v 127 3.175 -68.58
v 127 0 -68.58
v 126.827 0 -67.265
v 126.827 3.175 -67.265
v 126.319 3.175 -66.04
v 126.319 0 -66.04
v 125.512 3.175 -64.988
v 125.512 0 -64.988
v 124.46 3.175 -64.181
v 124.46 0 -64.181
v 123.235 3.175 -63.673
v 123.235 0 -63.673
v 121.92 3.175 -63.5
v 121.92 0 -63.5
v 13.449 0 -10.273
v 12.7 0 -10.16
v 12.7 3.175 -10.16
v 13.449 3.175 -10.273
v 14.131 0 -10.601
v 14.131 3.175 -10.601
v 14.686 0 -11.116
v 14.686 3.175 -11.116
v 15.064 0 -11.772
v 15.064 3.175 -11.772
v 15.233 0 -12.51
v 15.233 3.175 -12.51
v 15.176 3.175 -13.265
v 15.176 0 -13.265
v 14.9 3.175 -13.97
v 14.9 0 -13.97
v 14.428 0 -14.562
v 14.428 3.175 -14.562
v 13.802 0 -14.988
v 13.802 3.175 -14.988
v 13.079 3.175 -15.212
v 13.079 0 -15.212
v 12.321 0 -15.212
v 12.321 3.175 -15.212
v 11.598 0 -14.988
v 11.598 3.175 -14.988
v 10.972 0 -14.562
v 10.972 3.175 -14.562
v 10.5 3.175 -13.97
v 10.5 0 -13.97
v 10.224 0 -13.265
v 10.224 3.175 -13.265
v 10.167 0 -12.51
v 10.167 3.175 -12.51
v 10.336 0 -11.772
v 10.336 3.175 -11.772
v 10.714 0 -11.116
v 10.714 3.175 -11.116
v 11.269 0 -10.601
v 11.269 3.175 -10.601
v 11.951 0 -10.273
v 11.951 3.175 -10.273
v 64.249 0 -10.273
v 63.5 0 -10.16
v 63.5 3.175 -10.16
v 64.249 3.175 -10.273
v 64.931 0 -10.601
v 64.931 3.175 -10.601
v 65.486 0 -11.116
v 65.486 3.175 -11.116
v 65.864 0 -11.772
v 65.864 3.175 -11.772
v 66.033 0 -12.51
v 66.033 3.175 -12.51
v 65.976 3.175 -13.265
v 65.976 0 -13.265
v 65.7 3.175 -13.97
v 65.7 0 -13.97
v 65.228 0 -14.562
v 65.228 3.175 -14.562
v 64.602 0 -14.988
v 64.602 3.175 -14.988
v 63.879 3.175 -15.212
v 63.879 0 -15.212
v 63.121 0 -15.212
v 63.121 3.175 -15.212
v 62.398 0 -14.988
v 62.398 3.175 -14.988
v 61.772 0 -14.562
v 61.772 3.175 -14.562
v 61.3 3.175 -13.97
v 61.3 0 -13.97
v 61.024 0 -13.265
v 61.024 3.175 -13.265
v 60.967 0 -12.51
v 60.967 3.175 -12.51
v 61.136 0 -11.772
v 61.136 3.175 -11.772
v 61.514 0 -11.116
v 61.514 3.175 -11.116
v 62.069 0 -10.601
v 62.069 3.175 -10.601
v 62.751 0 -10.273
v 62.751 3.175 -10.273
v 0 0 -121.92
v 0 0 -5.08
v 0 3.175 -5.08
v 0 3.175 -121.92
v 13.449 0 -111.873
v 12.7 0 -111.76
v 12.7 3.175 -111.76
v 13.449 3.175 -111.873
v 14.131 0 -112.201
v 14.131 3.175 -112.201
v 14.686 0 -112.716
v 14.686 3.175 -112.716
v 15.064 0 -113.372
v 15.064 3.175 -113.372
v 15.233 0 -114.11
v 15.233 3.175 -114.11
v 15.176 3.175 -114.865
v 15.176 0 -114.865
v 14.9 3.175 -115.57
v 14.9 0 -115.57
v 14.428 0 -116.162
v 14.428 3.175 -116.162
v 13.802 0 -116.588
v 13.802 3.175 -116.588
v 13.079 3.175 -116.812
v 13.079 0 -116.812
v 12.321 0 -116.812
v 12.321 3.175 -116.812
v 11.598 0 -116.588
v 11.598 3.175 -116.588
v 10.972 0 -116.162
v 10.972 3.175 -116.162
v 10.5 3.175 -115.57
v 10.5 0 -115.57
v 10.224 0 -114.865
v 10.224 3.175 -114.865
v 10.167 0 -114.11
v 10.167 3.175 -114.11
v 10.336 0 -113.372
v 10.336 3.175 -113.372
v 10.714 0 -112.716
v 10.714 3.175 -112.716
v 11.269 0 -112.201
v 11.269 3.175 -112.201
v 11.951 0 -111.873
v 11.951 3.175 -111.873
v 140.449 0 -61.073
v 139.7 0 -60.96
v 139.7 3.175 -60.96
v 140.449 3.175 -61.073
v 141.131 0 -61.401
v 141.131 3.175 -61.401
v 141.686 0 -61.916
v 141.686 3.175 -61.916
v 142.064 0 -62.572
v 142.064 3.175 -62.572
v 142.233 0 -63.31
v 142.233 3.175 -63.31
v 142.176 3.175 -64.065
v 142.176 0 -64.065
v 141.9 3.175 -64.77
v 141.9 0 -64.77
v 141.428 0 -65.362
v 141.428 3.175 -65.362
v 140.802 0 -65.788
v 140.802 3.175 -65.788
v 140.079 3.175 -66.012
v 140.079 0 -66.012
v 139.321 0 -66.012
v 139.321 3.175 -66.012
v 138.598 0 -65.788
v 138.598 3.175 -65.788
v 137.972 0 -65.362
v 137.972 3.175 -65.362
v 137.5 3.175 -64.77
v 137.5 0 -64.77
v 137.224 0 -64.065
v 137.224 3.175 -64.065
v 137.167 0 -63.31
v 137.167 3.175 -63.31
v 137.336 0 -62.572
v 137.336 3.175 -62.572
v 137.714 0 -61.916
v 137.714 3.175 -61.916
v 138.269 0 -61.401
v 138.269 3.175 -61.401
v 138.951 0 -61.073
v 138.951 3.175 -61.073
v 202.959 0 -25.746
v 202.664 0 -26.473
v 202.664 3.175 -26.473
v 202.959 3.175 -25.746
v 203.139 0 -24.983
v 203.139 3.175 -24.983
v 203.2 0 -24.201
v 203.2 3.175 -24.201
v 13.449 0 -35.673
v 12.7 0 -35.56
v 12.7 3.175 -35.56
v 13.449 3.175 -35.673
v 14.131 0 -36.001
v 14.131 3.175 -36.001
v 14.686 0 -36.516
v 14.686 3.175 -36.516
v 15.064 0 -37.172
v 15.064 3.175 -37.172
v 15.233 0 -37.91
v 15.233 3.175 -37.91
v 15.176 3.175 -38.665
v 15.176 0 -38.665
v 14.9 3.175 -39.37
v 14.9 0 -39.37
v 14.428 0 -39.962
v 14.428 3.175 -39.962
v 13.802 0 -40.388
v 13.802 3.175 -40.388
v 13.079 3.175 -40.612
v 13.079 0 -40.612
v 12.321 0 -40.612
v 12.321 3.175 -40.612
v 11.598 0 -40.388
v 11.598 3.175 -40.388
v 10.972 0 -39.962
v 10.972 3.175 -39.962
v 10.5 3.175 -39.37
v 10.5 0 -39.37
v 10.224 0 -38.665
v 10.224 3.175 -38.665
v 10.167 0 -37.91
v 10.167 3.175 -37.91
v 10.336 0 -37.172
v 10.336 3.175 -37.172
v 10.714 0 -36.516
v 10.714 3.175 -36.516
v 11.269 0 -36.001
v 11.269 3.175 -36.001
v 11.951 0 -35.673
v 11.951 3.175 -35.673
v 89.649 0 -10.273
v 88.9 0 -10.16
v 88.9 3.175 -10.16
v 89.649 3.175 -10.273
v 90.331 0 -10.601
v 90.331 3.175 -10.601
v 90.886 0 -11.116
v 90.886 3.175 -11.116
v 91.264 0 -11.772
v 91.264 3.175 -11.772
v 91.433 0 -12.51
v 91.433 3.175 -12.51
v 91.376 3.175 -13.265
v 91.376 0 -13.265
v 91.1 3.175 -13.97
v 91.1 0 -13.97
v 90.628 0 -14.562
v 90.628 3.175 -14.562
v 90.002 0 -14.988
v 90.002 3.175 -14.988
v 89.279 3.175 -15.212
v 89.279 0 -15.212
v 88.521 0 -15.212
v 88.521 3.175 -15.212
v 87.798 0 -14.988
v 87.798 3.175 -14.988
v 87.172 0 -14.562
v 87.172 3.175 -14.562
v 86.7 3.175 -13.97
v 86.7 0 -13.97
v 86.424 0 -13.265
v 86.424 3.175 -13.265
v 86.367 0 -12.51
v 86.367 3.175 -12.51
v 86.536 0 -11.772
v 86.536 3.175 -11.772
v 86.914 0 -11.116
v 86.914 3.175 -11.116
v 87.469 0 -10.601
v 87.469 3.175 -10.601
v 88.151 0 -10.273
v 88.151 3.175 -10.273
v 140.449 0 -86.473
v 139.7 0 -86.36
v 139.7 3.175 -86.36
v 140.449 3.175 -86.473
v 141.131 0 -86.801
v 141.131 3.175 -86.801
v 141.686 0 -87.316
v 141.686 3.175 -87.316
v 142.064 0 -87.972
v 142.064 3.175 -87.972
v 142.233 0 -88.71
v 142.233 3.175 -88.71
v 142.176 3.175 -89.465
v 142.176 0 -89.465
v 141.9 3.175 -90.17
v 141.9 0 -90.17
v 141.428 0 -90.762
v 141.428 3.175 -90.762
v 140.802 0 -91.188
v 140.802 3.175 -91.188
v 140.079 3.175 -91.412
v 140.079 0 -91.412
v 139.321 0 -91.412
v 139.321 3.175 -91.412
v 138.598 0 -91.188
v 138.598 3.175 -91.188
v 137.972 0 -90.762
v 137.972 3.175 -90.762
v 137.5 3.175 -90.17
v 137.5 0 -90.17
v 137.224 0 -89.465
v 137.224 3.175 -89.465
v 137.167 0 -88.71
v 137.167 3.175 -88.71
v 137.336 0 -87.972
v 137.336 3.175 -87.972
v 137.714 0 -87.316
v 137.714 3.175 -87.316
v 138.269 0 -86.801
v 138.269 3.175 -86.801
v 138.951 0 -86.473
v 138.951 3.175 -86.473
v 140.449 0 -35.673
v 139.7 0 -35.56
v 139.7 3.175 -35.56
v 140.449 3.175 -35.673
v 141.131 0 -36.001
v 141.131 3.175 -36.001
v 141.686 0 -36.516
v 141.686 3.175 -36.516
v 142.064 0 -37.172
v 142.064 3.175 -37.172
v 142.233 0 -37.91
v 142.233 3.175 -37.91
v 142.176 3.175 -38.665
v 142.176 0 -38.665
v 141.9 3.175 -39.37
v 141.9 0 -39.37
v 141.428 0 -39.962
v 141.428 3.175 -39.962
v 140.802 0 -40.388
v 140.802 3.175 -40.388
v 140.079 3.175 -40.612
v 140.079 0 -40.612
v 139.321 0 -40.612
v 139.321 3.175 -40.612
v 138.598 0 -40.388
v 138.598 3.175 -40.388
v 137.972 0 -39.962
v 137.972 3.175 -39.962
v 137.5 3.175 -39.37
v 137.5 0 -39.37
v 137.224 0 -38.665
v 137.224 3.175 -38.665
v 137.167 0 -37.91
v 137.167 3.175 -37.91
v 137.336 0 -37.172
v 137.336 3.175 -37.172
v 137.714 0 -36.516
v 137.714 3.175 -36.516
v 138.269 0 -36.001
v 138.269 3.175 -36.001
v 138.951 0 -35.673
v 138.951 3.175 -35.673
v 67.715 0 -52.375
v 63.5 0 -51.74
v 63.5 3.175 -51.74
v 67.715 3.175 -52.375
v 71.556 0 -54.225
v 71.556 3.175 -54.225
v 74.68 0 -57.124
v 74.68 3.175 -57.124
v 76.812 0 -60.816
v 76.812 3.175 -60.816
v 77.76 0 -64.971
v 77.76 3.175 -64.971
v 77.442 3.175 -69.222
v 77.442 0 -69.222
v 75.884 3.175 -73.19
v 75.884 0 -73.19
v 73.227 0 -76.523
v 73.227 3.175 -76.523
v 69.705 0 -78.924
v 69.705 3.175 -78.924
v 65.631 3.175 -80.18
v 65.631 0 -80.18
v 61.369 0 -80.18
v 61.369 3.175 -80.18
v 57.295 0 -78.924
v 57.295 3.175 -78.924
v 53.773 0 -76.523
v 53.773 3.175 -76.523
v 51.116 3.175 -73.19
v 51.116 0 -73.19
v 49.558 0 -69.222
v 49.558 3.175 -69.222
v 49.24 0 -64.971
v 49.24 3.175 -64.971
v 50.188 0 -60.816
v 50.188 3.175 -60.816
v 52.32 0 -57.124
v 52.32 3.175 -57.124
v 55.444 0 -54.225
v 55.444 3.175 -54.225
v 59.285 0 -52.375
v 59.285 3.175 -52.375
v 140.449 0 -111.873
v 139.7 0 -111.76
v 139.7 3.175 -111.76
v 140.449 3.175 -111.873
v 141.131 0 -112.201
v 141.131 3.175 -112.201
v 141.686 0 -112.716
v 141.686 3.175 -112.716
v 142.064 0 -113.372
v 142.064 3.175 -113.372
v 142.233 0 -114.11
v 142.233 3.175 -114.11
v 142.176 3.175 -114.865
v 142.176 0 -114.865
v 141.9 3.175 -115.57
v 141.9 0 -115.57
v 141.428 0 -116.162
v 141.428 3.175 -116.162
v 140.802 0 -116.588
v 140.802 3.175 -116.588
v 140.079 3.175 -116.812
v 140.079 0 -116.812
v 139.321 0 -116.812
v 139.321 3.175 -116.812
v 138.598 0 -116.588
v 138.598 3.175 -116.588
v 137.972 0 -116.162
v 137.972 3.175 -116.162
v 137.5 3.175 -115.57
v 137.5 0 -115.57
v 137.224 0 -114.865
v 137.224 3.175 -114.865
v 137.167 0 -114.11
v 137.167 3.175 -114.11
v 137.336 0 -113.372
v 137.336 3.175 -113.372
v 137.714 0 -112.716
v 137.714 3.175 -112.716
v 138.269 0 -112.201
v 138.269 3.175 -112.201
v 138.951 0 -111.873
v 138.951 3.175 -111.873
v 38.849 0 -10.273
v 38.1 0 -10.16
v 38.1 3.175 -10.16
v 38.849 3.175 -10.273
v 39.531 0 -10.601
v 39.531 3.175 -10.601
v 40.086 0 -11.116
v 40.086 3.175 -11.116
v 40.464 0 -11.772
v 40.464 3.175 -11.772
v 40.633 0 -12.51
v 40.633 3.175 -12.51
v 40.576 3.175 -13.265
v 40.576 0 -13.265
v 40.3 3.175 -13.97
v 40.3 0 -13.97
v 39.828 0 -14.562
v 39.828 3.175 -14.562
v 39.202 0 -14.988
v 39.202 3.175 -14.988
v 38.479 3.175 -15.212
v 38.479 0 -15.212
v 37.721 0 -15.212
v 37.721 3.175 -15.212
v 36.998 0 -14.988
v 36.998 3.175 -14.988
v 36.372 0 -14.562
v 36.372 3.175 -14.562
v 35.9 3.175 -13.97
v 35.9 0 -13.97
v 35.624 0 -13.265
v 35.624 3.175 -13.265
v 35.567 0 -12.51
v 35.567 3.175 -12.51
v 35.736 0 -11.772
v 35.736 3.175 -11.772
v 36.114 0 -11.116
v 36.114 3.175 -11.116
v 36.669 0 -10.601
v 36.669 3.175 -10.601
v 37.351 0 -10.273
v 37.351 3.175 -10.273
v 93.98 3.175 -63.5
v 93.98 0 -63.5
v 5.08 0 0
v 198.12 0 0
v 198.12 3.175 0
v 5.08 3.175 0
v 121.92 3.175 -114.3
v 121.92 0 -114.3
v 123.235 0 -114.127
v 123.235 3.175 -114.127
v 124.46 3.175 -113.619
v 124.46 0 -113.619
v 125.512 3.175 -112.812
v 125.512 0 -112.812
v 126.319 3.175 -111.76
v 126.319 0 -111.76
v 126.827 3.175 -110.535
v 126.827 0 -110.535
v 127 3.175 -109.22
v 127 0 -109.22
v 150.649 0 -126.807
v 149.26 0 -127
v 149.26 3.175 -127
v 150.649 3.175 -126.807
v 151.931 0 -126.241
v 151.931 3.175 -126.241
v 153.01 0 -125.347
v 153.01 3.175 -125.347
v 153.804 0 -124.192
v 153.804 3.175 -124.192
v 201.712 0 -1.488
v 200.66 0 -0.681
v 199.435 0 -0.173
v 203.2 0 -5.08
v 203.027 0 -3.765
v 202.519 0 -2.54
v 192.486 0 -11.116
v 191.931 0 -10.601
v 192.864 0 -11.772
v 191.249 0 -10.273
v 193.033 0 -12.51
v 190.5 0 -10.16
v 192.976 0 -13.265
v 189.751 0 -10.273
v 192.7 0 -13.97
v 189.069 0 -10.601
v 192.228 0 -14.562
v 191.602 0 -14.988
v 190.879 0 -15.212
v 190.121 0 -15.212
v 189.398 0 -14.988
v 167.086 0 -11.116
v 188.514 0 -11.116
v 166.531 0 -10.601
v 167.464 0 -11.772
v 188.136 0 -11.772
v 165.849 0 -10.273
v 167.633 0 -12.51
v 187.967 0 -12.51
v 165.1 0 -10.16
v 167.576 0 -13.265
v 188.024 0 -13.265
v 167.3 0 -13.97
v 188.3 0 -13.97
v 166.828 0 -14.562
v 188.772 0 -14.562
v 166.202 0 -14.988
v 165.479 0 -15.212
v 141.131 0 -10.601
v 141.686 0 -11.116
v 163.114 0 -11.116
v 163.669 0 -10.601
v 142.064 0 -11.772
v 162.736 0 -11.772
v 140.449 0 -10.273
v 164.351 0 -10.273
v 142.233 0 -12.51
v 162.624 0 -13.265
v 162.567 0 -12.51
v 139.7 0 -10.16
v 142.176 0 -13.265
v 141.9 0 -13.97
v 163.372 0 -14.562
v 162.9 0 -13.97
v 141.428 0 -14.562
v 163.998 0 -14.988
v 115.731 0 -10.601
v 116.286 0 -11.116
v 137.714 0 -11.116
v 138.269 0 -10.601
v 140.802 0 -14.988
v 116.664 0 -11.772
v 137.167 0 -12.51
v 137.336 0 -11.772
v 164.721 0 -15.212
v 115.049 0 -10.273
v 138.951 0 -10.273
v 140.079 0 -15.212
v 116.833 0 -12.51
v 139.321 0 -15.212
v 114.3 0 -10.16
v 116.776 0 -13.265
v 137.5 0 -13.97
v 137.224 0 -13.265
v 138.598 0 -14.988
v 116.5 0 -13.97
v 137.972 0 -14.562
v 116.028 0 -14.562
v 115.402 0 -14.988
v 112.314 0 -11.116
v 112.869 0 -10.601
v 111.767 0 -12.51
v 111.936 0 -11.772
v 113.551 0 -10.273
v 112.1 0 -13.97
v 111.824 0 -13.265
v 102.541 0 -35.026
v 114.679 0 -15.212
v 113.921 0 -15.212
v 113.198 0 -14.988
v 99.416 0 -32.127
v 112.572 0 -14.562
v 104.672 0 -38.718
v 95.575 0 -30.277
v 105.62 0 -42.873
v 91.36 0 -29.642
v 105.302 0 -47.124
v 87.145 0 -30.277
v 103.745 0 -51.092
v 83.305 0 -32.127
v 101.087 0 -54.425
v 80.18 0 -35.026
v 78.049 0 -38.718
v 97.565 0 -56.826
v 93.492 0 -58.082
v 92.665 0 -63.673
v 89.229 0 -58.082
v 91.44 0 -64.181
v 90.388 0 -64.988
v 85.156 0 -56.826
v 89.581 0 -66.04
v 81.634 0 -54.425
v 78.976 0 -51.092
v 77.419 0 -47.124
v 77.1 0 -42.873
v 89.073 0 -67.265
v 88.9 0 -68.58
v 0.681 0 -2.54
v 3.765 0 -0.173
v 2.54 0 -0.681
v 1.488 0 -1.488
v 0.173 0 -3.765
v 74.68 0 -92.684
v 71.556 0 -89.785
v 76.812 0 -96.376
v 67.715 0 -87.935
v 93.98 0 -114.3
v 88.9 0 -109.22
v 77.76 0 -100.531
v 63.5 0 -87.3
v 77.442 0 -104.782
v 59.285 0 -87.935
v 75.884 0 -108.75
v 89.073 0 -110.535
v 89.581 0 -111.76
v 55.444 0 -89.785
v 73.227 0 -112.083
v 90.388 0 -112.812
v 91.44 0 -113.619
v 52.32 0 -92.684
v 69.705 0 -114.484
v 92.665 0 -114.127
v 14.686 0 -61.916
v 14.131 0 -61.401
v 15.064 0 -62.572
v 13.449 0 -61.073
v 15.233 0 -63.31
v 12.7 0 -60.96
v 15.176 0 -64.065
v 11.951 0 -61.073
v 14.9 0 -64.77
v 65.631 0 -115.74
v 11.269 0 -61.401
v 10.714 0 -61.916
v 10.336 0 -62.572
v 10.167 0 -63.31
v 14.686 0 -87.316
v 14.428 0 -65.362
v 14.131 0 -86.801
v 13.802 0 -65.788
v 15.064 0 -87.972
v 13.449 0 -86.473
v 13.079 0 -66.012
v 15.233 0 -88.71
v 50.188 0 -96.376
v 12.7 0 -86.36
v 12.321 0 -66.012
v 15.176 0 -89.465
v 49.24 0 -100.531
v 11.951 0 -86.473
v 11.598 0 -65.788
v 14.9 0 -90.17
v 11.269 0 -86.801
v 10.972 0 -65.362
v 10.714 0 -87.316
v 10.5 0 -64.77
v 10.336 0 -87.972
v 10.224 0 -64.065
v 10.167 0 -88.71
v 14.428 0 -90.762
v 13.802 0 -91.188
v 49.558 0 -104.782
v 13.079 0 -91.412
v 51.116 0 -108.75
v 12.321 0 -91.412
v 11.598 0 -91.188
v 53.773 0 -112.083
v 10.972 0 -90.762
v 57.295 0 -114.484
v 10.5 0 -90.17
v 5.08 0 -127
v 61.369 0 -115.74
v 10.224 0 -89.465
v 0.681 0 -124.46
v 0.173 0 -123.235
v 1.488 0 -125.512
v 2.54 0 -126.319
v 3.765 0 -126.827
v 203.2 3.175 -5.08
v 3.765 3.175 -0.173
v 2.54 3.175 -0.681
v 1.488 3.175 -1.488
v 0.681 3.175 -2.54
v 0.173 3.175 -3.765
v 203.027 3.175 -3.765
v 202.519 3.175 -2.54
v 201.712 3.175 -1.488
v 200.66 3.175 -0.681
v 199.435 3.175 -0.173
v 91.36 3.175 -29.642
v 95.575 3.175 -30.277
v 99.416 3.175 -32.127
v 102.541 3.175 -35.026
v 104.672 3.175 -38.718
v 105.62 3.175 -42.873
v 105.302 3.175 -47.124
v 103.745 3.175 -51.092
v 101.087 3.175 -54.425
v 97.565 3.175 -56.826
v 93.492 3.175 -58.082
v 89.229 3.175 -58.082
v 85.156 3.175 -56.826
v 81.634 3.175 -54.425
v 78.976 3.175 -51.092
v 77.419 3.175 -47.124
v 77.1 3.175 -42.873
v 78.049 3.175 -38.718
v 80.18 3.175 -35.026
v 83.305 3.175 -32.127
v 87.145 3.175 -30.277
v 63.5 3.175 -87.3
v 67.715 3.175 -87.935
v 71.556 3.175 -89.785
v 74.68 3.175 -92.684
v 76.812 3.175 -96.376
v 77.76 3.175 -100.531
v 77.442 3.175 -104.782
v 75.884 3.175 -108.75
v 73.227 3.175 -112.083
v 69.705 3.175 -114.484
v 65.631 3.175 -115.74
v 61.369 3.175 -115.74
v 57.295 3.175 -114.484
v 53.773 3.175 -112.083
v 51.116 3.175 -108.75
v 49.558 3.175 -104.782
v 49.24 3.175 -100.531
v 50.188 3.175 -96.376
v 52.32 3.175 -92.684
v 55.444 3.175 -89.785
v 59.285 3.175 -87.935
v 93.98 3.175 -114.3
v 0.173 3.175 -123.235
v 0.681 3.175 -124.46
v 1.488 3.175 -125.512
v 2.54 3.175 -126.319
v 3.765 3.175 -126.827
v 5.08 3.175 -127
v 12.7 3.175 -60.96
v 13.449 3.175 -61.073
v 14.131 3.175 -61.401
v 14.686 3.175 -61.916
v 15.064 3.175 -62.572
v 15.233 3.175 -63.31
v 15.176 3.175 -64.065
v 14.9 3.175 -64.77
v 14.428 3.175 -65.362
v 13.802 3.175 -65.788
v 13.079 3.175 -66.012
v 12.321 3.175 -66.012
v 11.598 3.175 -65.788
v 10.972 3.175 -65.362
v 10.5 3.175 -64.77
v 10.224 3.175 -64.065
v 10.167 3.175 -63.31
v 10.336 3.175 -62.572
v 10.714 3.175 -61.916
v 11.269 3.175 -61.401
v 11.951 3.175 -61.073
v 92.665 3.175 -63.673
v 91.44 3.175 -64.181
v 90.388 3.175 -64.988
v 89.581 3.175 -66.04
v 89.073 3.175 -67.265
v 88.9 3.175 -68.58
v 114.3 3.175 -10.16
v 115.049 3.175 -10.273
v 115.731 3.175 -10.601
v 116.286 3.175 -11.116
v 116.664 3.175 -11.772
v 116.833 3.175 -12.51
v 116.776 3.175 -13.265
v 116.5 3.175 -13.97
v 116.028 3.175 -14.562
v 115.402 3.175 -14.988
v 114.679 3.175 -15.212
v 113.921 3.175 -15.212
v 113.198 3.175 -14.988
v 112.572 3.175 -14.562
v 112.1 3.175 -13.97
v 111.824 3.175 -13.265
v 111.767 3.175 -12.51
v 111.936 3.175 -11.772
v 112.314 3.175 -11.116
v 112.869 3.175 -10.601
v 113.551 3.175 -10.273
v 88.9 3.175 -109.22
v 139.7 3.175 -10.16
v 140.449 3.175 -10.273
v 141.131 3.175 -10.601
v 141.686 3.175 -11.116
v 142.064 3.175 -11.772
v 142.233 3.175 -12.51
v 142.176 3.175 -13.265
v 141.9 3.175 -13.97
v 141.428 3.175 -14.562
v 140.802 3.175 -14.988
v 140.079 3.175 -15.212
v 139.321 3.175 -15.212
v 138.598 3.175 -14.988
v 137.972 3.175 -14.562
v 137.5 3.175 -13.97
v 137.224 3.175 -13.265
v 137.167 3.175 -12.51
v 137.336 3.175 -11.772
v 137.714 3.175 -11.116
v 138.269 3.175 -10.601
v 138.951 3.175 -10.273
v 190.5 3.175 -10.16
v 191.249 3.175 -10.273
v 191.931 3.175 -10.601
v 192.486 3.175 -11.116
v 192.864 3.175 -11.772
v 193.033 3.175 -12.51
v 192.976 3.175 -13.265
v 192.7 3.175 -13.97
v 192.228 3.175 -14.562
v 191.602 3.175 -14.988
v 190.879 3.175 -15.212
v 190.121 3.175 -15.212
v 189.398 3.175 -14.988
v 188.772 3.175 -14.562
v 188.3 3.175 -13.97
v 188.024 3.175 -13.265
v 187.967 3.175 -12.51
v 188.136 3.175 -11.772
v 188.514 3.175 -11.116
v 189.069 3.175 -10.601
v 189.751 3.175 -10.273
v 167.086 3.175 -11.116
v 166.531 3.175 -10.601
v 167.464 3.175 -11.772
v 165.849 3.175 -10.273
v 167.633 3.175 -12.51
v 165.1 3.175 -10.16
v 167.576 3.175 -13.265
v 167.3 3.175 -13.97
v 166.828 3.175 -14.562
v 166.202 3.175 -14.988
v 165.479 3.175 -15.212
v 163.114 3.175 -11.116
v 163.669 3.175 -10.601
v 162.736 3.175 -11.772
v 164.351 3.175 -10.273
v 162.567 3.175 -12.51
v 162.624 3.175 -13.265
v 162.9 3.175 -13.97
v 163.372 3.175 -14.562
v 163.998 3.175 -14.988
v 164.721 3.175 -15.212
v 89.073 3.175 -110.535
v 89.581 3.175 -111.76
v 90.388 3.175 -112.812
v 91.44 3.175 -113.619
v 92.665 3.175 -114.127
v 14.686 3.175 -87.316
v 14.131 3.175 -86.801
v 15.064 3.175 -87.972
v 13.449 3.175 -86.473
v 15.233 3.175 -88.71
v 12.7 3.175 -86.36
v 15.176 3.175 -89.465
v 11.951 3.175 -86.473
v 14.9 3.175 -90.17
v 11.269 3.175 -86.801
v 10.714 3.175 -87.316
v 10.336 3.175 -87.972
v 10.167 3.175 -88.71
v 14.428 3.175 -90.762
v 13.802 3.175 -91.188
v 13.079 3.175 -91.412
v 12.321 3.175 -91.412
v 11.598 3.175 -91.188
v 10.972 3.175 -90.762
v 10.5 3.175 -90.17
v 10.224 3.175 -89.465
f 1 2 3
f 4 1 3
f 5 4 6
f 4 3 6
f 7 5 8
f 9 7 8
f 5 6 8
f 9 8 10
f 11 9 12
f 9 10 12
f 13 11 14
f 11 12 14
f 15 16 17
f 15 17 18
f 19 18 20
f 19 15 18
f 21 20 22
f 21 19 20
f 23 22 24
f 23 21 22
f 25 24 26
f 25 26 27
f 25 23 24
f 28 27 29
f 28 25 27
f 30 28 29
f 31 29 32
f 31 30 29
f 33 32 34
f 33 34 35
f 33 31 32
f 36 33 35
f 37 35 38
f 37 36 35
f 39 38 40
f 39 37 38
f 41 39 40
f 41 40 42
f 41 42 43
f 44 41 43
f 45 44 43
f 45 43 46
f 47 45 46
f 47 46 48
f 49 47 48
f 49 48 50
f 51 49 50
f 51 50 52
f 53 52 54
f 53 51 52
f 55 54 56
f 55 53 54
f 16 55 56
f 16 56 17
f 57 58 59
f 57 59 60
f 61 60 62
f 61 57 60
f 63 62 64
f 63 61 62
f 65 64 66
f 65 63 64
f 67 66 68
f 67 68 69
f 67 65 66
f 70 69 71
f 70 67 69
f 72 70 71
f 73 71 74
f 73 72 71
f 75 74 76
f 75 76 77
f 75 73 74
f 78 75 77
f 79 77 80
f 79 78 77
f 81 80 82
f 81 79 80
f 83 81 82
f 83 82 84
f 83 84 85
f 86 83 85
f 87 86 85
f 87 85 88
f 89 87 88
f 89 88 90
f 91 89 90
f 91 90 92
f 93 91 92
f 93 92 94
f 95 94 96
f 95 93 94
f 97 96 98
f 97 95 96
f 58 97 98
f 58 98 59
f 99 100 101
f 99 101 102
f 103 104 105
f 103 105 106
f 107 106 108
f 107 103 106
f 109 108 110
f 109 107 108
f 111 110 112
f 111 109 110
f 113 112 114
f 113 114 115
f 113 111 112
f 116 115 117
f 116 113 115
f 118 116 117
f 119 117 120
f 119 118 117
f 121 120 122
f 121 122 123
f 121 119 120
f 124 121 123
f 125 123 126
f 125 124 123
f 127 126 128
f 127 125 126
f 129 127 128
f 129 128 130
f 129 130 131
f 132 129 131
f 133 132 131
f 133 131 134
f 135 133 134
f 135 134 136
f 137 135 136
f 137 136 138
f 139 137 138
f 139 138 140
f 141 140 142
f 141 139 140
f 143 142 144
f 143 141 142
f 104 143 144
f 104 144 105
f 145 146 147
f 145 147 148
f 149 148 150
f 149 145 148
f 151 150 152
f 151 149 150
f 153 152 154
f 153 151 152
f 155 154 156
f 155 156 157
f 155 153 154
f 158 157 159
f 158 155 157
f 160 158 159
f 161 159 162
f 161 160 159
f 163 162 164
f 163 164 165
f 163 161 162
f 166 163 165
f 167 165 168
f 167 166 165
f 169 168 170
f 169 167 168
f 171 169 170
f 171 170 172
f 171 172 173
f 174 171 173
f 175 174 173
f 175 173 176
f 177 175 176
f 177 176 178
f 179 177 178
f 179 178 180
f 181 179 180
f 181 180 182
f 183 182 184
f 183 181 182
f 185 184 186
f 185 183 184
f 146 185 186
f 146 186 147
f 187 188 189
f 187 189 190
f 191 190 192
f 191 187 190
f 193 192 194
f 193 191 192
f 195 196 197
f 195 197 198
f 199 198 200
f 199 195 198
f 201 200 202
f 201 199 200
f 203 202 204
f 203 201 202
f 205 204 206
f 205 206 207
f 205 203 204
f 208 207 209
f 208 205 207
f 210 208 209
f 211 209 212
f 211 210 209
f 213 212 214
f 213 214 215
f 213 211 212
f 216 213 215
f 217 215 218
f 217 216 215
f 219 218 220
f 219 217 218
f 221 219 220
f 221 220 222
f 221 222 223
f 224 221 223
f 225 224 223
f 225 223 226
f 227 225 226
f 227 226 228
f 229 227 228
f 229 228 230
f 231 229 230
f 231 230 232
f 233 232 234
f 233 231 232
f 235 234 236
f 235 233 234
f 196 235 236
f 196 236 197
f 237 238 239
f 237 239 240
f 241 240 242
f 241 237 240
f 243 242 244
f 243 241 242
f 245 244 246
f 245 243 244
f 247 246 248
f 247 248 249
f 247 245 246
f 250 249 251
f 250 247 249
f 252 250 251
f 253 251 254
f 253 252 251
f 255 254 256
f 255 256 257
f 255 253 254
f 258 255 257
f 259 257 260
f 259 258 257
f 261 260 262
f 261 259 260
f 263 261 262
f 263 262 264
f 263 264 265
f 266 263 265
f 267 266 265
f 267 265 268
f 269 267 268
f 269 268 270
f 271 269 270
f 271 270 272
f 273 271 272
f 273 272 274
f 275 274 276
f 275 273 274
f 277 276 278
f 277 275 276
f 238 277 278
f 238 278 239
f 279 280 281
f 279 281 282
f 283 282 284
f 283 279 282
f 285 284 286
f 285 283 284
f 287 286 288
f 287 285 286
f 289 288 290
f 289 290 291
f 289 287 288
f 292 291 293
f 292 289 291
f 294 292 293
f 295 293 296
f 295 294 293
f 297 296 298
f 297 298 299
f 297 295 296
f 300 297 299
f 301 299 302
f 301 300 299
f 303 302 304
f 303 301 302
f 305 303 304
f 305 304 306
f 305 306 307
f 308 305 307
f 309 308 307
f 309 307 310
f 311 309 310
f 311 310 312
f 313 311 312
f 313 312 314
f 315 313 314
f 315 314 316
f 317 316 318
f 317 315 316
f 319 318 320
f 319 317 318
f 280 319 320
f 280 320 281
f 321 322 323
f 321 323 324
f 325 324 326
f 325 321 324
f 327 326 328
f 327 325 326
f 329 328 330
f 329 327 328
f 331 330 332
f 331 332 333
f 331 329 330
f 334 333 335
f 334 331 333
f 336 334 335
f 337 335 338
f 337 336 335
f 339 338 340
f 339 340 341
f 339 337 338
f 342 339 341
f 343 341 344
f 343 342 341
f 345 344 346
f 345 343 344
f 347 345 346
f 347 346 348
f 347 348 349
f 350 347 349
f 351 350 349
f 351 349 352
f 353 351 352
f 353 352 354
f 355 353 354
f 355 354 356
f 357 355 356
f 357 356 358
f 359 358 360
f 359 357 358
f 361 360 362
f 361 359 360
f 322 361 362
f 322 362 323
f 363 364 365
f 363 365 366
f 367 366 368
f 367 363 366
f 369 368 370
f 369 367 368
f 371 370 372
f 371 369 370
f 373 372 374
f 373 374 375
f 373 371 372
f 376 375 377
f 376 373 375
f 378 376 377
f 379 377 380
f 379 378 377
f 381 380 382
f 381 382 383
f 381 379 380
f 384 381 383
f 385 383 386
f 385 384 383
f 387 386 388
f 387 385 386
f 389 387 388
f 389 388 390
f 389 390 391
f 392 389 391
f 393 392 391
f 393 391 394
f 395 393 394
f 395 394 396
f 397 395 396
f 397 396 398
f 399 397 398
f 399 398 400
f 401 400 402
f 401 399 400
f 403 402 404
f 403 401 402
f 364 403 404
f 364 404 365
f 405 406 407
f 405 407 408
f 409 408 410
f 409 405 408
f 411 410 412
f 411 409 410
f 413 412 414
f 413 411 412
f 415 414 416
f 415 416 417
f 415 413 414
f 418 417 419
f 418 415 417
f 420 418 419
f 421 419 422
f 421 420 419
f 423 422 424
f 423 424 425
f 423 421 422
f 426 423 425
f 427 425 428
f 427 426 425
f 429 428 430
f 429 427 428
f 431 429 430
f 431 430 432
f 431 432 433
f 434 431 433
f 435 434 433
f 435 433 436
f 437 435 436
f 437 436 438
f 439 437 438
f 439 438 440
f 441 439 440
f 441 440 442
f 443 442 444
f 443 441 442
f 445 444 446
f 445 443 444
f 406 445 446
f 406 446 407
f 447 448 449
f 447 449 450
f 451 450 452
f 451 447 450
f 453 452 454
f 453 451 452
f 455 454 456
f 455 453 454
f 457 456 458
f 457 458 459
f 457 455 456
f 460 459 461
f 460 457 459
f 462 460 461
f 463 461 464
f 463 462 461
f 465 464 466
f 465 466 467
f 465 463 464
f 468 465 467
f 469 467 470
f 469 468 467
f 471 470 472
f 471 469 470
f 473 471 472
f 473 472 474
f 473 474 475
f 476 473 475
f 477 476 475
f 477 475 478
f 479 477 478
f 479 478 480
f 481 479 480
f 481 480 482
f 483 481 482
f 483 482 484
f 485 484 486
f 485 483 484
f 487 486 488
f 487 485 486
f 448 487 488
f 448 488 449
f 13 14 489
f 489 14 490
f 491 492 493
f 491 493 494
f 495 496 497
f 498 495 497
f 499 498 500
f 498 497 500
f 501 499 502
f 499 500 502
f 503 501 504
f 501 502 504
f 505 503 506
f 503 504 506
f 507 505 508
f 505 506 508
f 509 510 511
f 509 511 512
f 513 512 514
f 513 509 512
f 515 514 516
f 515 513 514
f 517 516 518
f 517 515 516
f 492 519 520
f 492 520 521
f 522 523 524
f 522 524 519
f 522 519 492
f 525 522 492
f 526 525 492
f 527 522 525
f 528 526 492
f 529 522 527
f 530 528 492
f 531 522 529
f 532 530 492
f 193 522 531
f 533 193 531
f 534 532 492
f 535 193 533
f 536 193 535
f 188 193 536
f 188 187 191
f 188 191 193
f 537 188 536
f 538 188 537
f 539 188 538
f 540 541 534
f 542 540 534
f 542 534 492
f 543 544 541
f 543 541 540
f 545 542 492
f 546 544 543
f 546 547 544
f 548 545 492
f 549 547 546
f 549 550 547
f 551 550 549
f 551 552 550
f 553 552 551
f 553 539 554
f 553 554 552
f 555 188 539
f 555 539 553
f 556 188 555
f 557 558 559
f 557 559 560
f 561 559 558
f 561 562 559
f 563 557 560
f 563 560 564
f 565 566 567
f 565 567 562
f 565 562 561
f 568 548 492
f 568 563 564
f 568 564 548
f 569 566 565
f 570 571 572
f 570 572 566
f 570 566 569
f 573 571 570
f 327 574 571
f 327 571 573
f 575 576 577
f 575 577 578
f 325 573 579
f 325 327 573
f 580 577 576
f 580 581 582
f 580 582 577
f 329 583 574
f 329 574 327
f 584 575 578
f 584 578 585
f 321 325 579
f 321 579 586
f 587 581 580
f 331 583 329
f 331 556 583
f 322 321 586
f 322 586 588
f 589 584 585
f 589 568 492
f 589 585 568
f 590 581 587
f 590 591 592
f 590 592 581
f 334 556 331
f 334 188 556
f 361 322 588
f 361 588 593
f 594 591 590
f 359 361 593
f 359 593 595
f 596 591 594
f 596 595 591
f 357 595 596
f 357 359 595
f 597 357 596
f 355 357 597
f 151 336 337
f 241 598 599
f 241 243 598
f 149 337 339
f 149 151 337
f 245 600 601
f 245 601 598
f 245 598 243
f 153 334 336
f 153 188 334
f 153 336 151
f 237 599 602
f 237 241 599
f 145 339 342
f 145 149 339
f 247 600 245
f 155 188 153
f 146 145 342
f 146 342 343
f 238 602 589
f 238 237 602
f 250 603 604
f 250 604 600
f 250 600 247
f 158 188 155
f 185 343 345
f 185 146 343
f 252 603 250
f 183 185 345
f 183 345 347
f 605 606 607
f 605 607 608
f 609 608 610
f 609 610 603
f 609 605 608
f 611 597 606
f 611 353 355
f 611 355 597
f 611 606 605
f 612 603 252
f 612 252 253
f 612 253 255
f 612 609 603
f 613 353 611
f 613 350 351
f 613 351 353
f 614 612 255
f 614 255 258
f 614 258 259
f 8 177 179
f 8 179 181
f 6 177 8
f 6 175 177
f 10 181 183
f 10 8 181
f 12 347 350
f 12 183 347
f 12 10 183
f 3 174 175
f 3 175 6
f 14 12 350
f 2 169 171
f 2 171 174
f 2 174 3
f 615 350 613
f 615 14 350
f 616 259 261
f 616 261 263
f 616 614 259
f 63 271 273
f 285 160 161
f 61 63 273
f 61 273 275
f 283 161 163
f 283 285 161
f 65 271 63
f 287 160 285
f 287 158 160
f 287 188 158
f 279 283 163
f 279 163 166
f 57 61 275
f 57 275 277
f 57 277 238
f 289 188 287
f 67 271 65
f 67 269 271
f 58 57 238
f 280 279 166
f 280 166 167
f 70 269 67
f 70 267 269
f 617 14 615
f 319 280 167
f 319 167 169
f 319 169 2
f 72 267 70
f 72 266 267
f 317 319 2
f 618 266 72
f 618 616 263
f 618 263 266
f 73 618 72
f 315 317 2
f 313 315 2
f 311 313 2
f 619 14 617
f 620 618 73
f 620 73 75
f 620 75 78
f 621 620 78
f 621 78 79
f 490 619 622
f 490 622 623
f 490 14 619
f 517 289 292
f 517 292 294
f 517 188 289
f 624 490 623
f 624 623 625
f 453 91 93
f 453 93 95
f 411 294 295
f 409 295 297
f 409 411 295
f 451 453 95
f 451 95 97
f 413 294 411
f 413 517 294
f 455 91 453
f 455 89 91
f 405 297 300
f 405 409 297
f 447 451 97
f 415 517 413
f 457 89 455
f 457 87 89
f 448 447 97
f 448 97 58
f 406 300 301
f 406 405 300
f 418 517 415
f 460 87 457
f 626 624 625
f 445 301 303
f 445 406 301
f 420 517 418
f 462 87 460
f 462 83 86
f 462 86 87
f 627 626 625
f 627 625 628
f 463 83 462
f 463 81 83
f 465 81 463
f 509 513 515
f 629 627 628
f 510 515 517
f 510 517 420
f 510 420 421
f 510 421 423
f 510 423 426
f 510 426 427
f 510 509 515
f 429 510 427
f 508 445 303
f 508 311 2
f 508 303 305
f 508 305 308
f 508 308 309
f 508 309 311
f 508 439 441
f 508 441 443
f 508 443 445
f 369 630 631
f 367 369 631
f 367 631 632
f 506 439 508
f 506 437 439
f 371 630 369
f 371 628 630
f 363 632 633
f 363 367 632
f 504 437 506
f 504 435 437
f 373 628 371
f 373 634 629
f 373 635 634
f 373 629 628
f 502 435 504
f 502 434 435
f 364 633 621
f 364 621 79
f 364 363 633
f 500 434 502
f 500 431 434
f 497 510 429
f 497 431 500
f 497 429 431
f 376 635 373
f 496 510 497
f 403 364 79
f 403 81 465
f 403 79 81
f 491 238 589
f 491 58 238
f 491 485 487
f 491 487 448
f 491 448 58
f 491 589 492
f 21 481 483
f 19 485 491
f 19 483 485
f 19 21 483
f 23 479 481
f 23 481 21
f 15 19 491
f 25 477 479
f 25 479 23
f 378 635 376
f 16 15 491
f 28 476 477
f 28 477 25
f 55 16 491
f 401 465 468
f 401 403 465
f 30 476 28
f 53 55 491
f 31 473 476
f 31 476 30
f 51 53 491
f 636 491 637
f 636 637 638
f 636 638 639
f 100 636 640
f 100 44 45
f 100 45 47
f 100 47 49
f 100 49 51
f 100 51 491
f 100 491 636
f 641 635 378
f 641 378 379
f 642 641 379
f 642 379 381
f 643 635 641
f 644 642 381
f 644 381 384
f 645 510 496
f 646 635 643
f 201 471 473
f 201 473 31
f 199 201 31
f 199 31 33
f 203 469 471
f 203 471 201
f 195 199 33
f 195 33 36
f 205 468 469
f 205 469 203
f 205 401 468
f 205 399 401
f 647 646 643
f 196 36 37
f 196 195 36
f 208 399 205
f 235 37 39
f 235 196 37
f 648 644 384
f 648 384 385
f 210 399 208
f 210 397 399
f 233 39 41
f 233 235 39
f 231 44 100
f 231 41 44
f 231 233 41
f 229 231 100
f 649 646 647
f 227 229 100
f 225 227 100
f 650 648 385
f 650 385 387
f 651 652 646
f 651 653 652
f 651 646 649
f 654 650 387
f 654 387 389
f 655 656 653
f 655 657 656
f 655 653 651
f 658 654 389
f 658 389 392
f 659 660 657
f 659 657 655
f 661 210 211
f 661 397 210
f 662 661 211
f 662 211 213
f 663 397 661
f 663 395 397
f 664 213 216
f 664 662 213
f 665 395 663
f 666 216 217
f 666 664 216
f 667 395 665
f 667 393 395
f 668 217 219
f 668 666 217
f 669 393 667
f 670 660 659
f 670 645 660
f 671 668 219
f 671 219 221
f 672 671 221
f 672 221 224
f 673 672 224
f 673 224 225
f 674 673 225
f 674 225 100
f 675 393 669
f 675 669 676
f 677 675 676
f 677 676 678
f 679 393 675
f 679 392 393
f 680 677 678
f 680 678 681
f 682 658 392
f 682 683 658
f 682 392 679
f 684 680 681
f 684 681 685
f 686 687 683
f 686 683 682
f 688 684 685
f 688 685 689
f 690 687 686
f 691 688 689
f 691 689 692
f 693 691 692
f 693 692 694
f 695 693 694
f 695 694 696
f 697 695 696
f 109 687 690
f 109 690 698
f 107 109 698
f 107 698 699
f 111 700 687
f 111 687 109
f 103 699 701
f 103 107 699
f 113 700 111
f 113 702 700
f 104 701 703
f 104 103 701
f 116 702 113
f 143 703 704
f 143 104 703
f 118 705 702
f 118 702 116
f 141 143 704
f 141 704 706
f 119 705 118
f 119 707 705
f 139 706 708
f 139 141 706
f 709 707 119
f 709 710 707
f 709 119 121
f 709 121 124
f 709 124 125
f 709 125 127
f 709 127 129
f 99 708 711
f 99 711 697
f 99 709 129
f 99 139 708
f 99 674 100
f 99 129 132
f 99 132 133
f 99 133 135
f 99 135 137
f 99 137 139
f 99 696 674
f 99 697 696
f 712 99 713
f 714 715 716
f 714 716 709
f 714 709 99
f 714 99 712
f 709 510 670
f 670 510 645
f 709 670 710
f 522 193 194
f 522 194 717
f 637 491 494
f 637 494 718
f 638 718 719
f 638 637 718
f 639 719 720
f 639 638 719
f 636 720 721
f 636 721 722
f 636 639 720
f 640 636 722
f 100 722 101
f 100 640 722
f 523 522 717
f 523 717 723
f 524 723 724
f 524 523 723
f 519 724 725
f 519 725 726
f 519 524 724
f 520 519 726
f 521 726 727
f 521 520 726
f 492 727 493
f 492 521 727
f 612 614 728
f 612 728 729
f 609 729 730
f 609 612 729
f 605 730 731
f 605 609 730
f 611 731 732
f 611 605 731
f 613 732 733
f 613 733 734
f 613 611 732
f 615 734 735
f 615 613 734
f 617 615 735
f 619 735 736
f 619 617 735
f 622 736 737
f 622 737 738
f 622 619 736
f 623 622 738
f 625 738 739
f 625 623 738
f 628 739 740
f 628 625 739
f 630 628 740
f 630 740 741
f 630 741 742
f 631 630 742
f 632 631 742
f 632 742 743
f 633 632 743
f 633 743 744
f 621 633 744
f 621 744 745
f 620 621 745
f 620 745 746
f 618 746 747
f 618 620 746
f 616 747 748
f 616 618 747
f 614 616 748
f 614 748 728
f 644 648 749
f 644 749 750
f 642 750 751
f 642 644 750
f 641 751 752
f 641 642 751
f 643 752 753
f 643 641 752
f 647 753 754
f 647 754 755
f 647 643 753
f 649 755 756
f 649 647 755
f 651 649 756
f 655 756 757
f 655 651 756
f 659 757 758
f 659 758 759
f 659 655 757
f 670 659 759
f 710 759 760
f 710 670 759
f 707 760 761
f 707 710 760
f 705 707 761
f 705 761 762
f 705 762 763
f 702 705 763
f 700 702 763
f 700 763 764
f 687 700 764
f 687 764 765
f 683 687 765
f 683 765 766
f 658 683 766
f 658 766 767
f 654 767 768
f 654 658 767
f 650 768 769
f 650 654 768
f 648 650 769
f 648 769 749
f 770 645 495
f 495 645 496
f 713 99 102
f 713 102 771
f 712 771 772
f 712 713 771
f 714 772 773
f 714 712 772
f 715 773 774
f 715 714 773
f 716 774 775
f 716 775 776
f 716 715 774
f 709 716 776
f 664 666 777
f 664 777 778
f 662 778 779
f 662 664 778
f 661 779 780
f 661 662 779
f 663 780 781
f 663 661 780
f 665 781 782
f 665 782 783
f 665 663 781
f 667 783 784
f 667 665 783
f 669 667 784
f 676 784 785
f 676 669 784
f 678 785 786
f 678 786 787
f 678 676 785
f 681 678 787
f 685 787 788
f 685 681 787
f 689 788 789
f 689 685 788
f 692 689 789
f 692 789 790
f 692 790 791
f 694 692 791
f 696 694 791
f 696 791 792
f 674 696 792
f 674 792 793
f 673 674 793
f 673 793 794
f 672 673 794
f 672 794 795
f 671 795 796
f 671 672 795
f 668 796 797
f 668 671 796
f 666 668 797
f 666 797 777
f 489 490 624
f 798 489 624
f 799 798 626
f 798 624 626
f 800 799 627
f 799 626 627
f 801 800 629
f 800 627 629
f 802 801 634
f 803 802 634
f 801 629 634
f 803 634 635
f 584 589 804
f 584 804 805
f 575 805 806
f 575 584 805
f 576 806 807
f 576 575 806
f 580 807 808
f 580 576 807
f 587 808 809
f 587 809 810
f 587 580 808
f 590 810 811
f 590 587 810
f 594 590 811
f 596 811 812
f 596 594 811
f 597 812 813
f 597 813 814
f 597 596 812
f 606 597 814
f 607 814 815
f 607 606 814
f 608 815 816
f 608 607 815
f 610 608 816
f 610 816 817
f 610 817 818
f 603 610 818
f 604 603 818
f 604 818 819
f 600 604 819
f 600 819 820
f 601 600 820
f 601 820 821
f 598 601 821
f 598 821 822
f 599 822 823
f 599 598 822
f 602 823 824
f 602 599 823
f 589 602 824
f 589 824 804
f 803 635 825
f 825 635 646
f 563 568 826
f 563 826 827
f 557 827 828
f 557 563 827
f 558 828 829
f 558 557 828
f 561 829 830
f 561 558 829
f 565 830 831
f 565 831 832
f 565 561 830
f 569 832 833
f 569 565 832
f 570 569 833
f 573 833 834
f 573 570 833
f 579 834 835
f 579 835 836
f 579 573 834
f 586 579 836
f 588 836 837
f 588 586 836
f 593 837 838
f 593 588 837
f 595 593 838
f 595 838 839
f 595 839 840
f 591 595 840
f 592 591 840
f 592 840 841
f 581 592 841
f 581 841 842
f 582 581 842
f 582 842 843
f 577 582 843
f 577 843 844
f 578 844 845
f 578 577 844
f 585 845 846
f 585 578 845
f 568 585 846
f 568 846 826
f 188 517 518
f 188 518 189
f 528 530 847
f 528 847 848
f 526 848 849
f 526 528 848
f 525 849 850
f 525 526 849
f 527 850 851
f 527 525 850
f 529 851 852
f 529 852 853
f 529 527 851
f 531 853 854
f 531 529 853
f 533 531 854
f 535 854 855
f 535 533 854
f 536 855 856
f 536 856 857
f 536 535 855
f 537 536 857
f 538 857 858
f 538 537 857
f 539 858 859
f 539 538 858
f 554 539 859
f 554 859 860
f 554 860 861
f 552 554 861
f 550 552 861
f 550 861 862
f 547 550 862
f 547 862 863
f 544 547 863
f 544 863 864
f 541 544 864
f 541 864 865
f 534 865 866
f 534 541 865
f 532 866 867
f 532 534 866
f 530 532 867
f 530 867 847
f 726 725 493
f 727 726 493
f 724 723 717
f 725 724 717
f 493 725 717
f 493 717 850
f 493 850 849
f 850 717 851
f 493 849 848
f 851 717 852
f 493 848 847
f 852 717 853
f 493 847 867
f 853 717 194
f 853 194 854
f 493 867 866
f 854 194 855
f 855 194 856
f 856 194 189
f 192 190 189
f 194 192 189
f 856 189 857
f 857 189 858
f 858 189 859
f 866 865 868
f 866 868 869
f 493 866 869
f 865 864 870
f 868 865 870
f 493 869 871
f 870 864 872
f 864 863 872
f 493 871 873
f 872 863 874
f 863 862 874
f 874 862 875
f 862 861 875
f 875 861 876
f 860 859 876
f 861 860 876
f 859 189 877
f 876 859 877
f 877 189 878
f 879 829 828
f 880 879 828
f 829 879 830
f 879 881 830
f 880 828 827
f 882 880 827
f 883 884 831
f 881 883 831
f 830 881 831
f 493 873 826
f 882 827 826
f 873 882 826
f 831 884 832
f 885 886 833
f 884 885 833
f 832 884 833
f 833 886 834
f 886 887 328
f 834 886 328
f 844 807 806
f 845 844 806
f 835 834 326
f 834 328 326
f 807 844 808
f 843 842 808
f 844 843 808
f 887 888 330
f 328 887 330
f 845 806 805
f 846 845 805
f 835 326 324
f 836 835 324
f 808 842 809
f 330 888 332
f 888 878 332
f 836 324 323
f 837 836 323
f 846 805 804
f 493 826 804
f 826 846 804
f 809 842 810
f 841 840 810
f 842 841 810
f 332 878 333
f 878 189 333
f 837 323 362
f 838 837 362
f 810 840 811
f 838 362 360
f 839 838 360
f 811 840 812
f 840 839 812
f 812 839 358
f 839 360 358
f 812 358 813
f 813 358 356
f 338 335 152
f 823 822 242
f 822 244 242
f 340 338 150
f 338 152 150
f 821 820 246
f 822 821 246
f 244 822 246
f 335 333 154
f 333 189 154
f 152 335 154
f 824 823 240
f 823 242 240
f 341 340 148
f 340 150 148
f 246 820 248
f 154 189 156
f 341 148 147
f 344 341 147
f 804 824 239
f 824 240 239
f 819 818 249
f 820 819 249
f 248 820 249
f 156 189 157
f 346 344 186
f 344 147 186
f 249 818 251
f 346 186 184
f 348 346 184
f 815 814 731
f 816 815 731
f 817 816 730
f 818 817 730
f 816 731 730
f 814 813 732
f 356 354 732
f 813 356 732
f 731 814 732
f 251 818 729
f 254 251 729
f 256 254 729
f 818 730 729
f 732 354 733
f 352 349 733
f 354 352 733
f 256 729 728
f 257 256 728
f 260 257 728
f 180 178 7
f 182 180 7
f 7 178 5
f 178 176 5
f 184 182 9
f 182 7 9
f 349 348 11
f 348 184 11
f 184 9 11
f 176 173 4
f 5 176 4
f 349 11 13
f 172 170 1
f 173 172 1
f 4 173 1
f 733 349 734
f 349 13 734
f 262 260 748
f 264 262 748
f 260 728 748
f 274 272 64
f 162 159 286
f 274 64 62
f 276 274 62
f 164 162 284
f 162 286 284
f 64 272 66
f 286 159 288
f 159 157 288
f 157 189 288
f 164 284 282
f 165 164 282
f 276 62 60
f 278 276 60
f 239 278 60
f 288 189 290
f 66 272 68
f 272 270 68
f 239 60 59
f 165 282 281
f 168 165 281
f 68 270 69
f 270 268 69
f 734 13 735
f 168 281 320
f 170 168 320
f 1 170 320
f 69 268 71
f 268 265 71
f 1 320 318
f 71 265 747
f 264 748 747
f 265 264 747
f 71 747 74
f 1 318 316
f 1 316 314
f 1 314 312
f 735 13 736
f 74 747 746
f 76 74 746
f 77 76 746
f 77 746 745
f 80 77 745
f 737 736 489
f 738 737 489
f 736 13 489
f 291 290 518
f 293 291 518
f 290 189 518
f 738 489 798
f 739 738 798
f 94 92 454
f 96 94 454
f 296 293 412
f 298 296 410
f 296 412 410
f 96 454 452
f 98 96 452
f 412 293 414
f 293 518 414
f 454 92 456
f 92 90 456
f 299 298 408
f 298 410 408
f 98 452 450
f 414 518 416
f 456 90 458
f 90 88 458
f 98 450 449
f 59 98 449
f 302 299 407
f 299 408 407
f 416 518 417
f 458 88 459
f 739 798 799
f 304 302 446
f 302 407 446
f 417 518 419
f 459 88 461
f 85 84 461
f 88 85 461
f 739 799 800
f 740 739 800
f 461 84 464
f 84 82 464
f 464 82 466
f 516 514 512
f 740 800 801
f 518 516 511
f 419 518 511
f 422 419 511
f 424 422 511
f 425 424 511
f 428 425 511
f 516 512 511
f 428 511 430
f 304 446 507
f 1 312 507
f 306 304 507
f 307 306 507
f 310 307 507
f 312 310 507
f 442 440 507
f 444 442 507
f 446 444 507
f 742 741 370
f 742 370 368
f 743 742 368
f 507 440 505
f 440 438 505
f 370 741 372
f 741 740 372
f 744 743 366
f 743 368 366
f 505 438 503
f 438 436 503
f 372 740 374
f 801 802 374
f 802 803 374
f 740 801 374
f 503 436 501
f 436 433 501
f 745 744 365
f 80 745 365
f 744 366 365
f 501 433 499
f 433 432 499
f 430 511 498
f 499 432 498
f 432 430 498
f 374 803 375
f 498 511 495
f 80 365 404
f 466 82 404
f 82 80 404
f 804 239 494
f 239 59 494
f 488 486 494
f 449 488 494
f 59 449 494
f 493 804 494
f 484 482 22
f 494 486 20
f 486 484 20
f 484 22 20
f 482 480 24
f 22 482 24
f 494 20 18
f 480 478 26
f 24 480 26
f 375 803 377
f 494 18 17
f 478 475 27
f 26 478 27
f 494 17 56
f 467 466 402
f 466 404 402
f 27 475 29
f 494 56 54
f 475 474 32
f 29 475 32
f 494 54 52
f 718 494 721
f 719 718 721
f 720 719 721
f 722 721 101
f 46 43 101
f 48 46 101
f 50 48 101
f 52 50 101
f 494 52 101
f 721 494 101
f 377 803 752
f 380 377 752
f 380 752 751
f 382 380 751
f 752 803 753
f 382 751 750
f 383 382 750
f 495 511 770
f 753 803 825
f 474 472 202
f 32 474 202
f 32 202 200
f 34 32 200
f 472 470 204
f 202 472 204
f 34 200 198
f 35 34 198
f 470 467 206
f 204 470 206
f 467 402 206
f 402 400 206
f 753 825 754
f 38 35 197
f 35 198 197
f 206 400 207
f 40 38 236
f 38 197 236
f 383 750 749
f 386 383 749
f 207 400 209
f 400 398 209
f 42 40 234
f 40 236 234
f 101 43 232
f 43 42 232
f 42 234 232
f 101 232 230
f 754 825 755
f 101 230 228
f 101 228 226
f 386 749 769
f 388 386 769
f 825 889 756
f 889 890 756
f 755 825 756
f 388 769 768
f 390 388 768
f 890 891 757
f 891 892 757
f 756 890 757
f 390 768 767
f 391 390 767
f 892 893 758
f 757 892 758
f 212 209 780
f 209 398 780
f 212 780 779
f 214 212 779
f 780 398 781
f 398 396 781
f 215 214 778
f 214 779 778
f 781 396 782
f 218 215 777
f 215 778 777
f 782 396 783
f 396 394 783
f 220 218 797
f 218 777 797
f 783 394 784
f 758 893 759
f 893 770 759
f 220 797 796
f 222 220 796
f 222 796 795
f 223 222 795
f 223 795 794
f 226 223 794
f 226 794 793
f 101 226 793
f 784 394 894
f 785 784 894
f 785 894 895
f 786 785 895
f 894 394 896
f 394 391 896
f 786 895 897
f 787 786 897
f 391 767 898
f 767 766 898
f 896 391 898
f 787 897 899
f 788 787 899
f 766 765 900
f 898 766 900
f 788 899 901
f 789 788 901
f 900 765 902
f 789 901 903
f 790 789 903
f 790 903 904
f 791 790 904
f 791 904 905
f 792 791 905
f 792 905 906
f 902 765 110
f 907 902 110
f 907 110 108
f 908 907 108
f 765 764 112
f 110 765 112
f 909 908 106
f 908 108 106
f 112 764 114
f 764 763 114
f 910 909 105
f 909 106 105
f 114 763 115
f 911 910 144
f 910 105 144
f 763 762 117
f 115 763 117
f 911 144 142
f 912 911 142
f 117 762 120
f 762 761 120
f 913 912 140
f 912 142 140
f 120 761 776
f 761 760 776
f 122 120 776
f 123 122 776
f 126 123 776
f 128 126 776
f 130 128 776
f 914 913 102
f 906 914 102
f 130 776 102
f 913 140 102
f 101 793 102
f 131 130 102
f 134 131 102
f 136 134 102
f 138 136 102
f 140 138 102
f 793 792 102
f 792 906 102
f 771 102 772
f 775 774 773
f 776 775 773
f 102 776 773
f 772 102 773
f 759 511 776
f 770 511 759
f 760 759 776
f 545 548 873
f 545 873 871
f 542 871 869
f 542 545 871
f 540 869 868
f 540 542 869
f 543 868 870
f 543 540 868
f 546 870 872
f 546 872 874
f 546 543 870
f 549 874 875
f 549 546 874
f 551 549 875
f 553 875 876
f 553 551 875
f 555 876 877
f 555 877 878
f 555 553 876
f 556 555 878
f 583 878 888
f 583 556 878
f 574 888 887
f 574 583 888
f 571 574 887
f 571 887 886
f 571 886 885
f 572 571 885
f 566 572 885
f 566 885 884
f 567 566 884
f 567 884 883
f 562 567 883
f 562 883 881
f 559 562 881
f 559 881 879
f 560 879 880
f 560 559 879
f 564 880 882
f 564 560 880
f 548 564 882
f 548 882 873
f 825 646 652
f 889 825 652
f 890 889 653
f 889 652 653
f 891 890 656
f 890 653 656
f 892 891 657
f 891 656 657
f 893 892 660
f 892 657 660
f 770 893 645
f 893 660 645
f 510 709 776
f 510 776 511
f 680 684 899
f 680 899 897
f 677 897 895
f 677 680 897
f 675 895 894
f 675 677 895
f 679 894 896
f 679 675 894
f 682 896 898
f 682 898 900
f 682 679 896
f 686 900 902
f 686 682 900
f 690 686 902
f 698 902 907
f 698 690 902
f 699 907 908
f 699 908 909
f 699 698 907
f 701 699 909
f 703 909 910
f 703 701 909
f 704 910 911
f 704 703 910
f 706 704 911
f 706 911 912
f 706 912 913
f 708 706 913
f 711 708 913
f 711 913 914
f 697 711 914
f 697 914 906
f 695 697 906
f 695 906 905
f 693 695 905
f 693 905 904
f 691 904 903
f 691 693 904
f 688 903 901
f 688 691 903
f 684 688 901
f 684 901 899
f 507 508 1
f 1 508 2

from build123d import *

# Parameters (mm, degrees)
SKETCH1_R           = 2.54
SKETCH1_R_2         = 14.3002
BOSS_EXTRUDE1_DEPTH = 3.175


with BuildPart() as part:
    # Sketch1 → Boss-Extrude1 (new body)
    with BuildSketch(Plane(origin=(0, 0, 0), x_dir=(1, 0, 0), z_dir=(0, 1, 0))):
        with BuildLine():
            Line((0, 5.08), (0, 121.92))
            ThreePointArc((0, 121.92), (1.487897552, 125.512102448), (5.08, 127))
            Line((5.08, 127), (149.260387337, 127))
            ThreePointArc((149.260387337, 127), (151.931101387, 126.241306106), (153.804077467, 124.191845065))
            Line((153.804077467, 124.191845065), (202.66369013, 26.472619739))
            ThreePointArc((202.66369013, 26.472619739), (203.064104866, 25.367919511), (203.2, 24.200774674))
            Line((203.2, 24.200774674), (203.2, 5.08))
            ThreePointArc((203.2, 5.08), (201.712102448, 1.487897552), (198.12, 0))
            Line((198.12, 0), (5.08, 0))
            ThreePointArc((5.08, 0), (1.487897552, 1.487897552), (0, 5.08))
        make_face()
        with Locations(Location((190.5, 12.7, 0), (0, 0, 270))):
            Circle(SKETCH1_R, mode=Mode.SUBTRACT)
        with Locations(Location((165.1, 12.7, 0), (0, 0, 270))):
            Circle(SKETCH1_R, mode=Mode.SUBTRACT)
        with Locations(Location((139.7, 12.7, 0), (0, 0, 270))):
            Circle(SKETCH1_R, mode=Mode.SUBTRACT)
        with Locations(Location((114.3, 12.7, 0), (0, 0, 270))):
            Circle(SKETCH1_R, mode=Mode.SUBTRACT)
        with Locations(Location((88.9, 12.7, 0), (0, 0, 270))):
            Circle(SKETCH1_R, mode=Mode.SUBTRACT)
        with Locations(Location((63.5, 12.7, 0), (0, 0, 270))):
            Circle(SKETCH1_R, mode=Mode.SUBTRACT)
        with Locations(Location((38.1, 12.7, 0), (0, 0, 270))):
            Circle(SKETCH1_R, mode=Mode.SUBTRACT)
        with Locations(Location((12.7, 12.7, 0), (0, 0, 270))):
            Circle(SKETCH1_R, mode=Mode.SUBTRACT)
        with Locations(Location((12.7, 38.1, 0), (0, 0, 270))):
            Circle(SKETCH1_R, mode=Mode.SUBTRACT)
        with Locations(Location((139.7, 38.1, 0), (0, 0, 270))):
            Circle(SKETCH1_R, mode=Mode.SUBTRACT)
        with Locations(Location((12.7, 63.5, 0), (0, 0, 270))):
            Circle(SKETCH1_R, mode=Mode.SUBTRACT)
        with Locations(Location((139.7, 63.5, 0), (0, 0, 270))):
            Circle(SKETCH1_R, mode=Mode.SUBTRACT)
        with Locations(Location((12.7, 88.9, 0), (0, 0, 270))):
            Circle(SKETCH1_R, mode=Mode.SUBTRACT)
        with Locations(Location((139.7, 88.9, 0), (0, 0, 270))):
            Circle(SKETCH1_R, mode=Mode.SUBTRACT)
        with Locations(Location((12.7, 114.3, 0), (0, 0, 270))):
            Circle(SKETCH1_R, mode=Mode.SUBTRACT)
        with Locations(Location((139.7, 114.3, 0), (0, 0, 270))):
            Circle(SKETCH1_R, mode=Mode.SUBTRACT)
        with Locations(Location((63.5, 101.6, 0), (0, 0, 270))):
            Circle(SKETCH1_R_2, mode=Mode.SUBTRACT)
        with Locations(Location((63.5, 66.04, 0), (0, 0, 270))):
            Circle(SKETCH1_R_2, mode=Mode.SUBTRACT)
        with Locations(Location((91.360222469, 43.942, 0), (0, 0, 270))):
            Circle(SKETCH1_R_2, mode=Mode.SUBTRACT)
        with BuildLine():
            Line((93.98, 114.3), (121.92, 114.3))
            ThreePointArc((121.92, 114.3), (125.512102448, 112.812102448), (127, 109.22))
            Line((127, 109.22), (127, 68.58))
            ThreePointArc((127, 68.58), (125.512102448, 64.987897552), (121.92, 63.5))
            Line((121.92, 63.5), (93.98, 63.5))
            ThreePointArc((93.98, 63.5), (90.387897552, 64.987897552), (88.9, 68.58))
            Line((88.9, 68.58), (88.9, 109.22))
            ThreePointArc((88.9, 109.22), (90.387897552, 112.812102448), (93.98, 114.3))
        make_face(mode=Mode.SUBTRACT)
    extrude(amount=BOSS_EXTRUDE1_DEPTH)


solid = part.part
